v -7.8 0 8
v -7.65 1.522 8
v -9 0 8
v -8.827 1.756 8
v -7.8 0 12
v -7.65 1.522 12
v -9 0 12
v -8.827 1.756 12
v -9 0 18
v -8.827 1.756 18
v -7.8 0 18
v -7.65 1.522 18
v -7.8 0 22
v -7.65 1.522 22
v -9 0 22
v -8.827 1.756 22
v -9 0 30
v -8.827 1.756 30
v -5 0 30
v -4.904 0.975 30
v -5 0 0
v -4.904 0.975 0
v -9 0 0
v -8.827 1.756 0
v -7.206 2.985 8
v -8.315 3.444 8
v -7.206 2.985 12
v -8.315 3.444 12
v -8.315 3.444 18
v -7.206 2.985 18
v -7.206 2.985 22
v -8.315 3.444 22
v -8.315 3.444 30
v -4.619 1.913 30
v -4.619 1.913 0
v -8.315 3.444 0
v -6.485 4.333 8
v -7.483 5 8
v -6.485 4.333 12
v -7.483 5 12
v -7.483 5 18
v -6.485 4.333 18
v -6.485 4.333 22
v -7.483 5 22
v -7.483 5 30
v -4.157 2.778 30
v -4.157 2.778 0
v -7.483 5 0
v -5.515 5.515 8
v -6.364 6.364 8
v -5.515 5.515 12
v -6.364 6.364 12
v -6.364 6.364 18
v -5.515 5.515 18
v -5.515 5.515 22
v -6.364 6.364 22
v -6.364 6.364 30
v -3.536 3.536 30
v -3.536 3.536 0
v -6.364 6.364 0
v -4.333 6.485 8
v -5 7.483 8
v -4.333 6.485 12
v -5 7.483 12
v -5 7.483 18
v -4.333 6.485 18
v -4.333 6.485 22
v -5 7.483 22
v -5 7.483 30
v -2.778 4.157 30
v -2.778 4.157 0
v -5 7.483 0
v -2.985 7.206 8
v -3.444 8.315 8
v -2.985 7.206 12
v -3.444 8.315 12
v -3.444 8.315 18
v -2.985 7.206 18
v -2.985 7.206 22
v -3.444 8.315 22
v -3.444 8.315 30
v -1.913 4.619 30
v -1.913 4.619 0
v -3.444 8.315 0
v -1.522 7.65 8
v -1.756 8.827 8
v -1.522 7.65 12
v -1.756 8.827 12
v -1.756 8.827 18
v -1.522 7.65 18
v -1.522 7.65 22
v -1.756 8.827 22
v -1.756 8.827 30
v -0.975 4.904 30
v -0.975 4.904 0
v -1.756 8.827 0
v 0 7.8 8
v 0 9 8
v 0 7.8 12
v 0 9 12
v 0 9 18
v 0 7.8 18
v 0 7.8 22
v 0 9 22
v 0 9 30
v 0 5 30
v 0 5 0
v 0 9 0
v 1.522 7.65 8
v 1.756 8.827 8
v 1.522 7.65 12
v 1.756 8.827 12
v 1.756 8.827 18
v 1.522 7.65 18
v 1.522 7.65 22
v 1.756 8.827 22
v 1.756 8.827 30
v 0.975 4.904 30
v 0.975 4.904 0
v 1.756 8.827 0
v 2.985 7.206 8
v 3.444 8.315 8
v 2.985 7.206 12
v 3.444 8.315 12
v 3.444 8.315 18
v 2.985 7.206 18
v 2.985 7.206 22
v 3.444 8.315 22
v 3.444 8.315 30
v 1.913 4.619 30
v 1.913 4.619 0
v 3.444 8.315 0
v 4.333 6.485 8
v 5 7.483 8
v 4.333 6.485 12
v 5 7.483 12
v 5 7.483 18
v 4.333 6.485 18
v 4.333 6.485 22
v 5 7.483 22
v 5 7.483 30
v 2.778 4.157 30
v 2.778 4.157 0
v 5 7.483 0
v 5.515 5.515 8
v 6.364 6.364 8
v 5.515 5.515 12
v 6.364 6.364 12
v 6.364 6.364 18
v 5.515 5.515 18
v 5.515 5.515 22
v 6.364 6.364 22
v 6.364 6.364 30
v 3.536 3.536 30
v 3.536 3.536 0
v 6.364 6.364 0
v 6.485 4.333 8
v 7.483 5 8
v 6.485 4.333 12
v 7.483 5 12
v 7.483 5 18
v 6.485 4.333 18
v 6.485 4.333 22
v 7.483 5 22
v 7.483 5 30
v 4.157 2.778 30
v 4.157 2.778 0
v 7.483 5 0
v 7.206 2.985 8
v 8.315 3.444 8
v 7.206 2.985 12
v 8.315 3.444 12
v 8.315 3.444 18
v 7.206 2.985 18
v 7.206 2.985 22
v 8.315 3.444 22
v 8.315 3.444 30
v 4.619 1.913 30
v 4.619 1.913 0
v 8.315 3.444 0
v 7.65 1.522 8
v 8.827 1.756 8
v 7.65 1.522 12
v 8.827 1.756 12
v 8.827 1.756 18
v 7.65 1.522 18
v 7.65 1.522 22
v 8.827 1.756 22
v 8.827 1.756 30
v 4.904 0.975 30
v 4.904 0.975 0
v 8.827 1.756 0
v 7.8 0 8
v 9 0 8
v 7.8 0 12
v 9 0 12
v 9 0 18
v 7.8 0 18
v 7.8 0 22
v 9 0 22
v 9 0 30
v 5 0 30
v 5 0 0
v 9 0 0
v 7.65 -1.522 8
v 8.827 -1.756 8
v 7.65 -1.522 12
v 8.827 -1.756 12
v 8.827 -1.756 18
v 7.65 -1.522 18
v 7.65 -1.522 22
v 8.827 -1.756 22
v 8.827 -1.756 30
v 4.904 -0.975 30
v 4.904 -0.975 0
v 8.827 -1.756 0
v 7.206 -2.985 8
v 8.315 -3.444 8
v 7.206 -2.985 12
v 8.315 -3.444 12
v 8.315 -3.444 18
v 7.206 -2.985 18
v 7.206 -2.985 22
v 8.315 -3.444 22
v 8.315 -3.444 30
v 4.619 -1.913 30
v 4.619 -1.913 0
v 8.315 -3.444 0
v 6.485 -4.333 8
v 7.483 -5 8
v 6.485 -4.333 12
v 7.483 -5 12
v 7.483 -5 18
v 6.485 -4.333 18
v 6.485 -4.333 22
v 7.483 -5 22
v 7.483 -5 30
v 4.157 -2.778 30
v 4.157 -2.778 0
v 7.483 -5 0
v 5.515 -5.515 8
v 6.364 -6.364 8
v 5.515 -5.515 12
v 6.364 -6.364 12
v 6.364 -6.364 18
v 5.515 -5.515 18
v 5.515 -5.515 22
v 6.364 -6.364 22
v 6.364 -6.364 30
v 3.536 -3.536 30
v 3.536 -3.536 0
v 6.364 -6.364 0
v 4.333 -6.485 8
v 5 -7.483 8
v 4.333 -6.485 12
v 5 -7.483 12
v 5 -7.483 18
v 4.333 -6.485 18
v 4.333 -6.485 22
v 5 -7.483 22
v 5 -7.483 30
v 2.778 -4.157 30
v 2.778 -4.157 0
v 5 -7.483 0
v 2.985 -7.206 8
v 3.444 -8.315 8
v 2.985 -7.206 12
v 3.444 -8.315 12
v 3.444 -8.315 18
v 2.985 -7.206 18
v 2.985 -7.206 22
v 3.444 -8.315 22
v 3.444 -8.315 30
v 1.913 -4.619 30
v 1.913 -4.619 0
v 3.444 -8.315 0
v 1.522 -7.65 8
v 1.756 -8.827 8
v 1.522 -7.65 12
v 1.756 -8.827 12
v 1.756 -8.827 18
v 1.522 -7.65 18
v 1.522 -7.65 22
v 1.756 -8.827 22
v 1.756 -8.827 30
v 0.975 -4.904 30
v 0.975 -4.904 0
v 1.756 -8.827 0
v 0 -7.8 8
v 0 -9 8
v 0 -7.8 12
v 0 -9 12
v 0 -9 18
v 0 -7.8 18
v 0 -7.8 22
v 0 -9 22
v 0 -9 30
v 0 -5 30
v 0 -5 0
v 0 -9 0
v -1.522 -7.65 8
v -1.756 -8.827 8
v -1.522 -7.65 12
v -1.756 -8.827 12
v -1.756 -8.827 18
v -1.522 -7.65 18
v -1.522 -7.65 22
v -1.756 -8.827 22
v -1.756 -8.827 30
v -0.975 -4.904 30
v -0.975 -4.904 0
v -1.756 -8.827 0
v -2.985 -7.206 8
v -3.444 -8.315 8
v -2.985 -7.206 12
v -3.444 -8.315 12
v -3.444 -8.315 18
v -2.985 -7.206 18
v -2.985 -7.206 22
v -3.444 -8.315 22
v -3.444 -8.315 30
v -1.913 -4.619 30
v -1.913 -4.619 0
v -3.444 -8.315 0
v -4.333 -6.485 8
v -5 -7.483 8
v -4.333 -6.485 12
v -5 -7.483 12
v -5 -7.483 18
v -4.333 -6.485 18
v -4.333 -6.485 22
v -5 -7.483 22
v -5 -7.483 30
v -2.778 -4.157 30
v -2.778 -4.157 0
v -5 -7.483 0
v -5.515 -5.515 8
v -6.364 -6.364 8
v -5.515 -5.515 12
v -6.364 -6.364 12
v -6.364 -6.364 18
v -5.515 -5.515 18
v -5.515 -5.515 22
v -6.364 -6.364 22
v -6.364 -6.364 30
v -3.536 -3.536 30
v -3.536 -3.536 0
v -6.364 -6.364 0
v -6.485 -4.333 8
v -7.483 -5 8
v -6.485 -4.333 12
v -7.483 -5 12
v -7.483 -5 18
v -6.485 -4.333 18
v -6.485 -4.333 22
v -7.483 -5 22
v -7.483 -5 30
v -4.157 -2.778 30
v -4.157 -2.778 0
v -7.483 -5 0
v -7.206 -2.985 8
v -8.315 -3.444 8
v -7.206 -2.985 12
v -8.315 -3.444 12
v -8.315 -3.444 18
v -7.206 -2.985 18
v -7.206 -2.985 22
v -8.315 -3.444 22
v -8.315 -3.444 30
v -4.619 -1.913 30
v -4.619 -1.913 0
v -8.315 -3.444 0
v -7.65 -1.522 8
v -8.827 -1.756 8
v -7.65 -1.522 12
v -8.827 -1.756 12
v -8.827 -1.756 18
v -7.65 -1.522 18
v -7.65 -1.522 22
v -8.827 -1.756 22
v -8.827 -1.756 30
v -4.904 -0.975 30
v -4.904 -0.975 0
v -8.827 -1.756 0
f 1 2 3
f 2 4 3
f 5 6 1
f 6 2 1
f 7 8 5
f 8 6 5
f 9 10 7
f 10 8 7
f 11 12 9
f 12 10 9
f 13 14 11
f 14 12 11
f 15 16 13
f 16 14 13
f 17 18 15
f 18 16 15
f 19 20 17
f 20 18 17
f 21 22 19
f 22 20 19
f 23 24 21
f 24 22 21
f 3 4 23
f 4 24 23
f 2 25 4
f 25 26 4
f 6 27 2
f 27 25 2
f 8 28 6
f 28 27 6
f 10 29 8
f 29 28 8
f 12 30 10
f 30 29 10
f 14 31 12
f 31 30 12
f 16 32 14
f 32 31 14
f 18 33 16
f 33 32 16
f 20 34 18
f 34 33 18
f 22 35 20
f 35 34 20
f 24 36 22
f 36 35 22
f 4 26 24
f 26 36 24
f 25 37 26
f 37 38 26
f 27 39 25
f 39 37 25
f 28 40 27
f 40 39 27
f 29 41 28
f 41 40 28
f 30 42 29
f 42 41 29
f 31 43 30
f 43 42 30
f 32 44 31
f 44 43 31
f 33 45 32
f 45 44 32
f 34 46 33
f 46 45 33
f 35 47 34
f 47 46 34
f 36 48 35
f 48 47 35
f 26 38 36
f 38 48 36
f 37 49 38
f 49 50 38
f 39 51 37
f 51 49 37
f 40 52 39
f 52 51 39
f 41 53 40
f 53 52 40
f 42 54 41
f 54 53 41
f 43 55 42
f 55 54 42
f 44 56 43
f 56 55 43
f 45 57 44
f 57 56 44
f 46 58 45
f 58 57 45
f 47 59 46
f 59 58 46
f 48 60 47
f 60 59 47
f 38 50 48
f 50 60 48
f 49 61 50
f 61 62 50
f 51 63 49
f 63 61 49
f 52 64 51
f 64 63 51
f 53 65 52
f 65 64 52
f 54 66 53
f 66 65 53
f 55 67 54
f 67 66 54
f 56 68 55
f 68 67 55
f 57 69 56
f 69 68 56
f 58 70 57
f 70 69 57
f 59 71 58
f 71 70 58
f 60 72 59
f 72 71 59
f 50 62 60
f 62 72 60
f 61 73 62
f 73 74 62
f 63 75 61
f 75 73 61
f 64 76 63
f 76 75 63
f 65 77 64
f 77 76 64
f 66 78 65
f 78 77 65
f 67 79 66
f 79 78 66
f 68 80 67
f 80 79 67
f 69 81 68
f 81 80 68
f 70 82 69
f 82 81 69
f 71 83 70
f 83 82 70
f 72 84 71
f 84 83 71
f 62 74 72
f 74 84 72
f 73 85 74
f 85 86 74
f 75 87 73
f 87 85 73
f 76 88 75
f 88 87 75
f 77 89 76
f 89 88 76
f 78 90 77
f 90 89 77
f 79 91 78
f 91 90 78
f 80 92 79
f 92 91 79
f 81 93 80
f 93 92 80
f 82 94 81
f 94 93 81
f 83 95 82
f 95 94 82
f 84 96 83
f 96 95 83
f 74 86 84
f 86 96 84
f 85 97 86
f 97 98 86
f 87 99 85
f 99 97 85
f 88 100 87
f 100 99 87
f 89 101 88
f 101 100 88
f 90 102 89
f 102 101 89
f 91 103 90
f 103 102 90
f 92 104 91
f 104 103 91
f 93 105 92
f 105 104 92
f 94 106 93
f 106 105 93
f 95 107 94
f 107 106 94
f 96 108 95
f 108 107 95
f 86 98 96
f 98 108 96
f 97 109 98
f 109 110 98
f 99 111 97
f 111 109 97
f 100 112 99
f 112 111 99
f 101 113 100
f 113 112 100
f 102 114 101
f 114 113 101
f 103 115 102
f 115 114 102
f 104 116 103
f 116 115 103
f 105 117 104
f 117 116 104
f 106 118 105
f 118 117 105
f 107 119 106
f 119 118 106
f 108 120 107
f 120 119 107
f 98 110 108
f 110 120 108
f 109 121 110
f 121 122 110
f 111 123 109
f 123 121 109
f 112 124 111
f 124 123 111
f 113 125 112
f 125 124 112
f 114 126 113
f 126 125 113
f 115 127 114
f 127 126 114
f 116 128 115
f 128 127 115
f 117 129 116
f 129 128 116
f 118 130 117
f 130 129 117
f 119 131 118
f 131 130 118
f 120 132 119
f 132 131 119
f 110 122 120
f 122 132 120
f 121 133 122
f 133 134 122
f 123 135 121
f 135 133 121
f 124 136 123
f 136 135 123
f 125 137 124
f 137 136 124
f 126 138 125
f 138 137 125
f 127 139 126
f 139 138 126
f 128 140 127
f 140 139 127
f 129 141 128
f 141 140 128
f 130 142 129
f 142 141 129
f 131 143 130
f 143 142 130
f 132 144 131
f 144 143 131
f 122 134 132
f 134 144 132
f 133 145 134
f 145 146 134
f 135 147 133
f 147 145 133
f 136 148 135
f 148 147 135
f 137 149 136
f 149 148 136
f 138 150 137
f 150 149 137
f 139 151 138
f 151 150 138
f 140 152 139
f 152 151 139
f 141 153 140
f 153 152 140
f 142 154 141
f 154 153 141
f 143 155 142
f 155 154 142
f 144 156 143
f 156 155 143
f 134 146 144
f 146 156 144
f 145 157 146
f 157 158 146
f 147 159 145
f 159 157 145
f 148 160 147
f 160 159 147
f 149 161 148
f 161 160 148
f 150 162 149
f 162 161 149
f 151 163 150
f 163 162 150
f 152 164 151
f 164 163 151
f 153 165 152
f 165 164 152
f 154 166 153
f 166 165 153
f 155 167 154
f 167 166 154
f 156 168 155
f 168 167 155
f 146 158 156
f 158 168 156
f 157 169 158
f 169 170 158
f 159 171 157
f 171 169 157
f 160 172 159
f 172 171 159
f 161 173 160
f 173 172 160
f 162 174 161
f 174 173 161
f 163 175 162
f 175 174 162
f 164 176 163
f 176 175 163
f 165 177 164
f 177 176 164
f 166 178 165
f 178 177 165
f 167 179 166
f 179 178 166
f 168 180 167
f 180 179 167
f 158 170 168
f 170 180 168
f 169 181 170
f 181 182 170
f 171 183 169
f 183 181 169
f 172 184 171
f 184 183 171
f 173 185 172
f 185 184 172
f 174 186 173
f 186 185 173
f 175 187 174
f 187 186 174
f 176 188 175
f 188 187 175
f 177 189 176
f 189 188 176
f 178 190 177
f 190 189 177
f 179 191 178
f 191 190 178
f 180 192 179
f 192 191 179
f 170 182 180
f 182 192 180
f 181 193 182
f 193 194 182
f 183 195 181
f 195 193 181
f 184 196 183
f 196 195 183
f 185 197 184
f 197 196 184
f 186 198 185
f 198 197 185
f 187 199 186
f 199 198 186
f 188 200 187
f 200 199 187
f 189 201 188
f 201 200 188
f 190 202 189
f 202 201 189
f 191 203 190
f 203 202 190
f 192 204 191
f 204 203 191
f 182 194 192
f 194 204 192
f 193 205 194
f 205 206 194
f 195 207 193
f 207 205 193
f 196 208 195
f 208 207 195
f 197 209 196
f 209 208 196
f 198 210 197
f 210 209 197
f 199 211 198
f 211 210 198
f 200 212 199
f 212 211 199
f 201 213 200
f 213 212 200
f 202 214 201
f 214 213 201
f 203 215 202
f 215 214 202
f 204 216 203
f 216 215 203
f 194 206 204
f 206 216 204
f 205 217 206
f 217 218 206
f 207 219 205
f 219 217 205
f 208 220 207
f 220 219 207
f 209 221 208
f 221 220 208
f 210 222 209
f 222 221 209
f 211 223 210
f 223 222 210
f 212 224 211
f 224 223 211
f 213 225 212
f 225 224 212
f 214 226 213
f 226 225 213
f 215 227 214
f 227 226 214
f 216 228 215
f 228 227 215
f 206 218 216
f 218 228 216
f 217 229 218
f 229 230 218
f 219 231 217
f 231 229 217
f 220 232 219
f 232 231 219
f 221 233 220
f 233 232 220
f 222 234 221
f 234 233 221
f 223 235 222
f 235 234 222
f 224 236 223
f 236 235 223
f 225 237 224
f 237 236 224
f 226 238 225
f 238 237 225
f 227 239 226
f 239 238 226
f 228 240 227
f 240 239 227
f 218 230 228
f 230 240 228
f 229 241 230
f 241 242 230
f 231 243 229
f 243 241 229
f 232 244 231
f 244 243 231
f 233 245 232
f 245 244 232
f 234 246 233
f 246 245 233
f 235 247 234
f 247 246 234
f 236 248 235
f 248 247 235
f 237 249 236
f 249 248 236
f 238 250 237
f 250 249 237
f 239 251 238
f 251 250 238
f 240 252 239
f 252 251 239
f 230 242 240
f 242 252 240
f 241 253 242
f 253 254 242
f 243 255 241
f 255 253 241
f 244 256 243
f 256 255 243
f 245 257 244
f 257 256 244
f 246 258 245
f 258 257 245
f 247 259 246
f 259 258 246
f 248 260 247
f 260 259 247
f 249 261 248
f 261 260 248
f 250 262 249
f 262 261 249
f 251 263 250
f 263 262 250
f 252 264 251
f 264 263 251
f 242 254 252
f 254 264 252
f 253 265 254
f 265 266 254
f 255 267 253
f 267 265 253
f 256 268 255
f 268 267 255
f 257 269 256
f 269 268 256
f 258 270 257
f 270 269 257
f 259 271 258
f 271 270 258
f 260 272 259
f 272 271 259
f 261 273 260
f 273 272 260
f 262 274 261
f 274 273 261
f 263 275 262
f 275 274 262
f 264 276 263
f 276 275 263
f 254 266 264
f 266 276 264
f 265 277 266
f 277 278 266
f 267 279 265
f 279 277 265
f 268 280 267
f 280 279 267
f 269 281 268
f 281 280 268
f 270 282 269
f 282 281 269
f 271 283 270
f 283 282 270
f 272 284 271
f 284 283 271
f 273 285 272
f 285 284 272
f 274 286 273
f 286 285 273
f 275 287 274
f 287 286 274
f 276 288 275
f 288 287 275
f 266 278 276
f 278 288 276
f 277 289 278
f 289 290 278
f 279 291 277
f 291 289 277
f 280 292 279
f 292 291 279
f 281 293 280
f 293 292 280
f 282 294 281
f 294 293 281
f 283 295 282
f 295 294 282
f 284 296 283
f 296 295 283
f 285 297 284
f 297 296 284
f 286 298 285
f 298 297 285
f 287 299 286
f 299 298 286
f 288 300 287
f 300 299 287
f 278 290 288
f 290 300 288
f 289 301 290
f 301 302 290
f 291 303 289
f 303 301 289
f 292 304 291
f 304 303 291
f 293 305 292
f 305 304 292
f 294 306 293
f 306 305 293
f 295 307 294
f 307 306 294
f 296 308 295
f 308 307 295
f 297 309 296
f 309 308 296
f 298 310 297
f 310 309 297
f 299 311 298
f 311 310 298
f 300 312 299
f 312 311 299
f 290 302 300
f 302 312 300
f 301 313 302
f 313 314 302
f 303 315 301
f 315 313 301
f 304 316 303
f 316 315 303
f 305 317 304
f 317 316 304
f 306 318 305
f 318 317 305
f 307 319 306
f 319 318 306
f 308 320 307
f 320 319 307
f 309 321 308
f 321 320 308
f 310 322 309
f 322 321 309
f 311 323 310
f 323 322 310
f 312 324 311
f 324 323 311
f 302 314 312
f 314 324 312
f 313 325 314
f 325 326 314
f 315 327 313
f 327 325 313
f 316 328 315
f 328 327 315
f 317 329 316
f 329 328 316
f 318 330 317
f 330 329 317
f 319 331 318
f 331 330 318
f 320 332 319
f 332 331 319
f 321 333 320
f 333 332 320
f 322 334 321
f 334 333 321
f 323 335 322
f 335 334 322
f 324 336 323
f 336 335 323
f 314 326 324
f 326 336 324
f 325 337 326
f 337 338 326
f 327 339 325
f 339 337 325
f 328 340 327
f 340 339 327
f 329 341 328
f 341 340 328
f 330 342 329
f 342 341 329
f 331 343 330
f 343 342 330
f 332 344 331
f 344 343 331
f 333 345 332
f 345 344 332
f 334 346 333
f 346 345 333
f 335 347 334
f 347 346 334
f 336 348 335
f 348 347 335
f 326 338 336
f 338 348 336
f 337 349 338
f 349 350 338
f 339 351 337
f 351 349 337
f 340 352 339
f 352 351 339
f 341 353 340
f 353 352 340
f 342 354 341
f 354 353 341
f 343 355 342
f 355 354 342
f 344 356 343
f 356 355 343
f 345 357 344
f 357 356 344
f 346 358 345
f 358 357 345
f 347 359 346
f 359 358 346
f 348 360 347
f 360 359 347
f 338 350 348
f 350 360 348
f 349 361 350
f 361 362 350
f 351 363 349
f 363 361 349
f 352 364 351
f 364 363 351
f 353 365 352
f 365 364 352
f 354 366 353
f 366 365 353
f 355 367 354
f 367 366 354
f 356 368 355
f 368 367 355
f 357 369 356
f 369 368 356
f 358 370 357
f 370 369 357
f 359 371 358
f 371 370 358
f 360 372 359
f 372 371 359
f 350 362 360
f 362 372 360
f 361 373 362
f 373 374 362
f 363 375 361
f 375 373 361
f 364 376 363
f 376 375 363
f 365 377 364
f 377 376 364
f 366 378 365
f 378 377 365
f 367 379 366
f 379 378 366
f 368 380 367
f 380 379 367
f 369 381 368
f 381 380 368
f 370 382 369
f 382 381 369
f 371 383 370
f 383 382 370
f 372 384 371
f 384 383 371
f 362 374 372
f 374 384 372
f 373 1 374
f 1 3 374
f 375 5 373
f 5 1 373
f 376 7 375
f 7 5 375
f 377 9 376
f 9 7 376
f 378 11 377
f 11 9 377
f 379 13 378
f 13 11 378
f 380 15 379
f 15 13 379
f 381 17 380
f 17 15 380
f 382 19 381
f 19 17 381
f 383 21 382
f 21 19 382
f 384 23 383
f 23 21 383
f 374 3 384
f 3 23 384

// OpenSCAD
$fn = 32;

// ----------------------------------------------------------------------
// Grooved revolve: stepped, bore R5
// ----------------------------------------------------------------------

// --- parameters (mm) ---
bore_r = 5;               // bore radius
outer_r = 9;              // outer radius of the body
total_h = 30;             // overall height, Z
wall = 4;                 // radial wall thickness
groove_w = 4;             // groove width
groove_d = 1.2;           // groove depth
grooves = 2;              // number of outer grooves

bbox_x = 2 * outer_r;  // full diameter
bore_d = 2 * bore_r;  // bore diameter
body_d = 2 * outer_r;  // body diameter
revolve_angle = 360;  // full turn around the Z axis

profile = [[5, 0], [9, 0], [9, 8], [7.8, 8], [7.8, 12], [9, 12], [9, 18], [7.8, 18], [7.8, 22], [9, 22], [9, 30], [5, 30]];  // primary outline, 12 points, counter clockwise

// --- the one profile operation ---
rotate_extrude(angle = revolve_angle) polygon(points = profile);
